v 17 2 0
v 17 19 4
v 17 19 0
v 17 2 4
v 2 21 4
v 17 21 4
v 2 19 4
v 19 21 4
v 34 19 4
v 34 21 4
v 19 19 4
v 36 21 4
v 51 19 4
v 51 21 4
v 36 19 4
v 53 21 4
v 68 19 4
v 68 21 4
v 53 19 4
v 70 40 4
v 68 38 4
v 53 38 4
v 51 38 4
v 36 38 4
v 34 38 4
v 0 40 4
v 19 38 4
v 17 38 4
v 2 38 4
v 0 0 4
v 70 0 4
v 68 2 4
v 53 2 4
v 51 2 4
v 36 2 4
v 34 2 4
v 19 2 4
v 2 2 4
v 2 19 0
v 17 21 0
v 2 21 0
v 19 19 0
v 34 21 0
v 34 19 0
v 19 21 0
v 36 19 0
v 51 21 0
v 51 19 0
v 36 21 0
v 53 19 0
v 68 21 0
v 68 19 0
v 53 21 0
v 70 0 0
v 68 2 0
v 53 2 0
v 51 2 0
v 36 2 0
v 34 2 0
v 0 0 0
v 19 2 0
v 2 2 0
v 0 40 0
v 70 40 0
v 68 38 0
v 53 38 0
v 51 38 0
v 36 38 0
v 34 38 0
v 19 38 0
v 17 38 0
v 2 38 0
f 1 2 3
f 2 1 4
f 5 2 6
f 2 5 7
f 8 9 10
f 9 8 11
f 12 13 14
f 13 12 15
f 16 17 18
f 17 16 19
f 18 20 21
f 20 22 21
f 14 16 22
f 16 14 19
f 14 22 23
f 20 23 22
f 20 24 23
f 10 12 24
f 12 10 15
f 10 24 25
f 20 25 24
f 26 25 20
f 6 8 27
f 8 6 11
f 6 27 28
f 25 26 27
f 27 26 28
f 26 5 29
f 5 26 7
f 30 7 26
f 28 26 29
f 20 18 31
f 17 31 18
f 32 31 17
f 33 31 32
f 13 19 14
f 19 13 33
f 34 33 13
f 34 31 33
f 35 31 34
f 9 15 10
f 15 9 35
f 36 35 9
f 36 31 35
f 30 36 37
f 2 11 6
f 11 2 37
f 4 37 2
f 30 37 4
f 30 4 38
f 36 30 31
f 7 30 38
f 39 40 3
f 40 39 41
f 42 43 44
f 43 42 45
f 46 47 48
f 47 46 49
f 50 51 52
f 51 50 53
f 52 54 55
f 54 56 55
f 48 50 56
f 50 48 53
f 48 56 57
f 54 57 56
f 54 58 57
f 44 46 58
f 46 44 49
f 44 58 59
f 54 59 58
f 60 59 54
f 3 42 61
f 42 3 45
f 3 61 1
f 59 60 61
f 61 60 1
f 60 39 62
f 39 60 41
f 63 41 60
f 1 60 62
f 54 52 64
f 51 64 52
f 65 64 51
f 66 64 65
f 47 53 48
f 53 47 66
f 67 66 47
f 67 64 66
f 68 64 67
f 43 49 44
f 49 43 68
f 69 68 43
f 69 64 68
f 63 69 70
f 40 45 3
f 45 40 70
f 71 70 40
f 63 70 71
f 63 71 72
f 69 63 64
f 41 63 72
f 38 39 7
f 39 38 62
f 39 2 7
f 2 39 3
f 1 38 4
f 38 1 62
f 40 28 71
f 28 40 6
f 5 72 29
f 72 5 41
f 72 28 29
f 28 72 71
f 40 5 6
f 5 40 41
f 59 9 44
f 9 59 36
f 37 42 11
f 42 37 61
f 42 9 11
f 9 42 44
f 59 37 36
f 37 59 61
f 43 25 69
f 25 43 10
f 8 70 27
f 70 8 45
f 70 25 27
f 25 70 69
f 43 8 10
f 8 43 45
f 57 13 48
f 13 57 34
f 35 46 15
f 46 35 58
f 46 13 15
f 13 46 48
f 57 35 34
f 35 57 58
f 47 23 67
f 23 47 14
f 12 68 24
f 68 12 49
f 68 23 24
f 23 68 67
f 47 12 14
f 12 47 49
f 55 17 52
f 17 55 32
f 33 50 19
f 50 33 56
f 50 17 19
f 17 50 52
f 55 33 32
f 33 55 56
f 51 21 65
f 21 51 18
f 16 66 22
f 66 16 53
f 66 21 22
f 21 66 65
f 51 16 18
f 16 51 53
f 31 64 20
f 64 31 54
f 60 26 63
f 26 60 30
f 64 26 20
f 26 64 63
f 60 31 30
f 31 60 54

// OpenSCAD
// ============================================================
//  Lightweighted Mounting Plate  70 × 40 × 4 mm
// ============================================================
//
//  Mass budget
//  -----------
//  Solid volume  =  70 × 40 × 4          = 11 200 mm³  (100 %)
//  Removed       =  4 cols × 2 rows
//                   × 15 × 17 × 4        =  8 160 mm³
//  Retained      =  3 040 mm³            =  27.1 %
//                   → well under 50 % target
//
//  Wall / web analysis
//  -------------------
//  Perimeter border  2 mm  ✓
//  Column webs       2 mm  ✓   (3 webs × 2 mm between 4 cols)
//  Row web           2 mm  ✓   (1 web  × 2 mm between 2 rows)
//
//  BOM
//  ---
//  1 ×  Mounting plate  70 × 40 × 4 mm  (PLA/PETG)  ≈ 3 040 mm³
// ============================================================

// ── Parameters ───────────────────────────────────────────────
plate_x = 70;
plate_y = 40;
plate_z =  4.0;

border  =  2.0;   // perimeter wall thickness (min 2 mm)
web     =  2.0;   // wall between adjacent pockets (min 2 mm)

cols    =  4;     // pocket columns (X direction)
rows    =  2;     // pocket rows    (Y direction)

// ── Derived pocket geometry ───────────────────────────────────
inner_x  = plate_x - 2*border;                   // 66 mm
inner_y  = plate_y - 2*border;                   // 36 mm
pocket_x = (inner_x - (cols-1)*web) / cols;      // 15 mm
pocket_y = (inner_y - (rows-1)*web) / rows;      // 17 mm

// ── Sanity echoes ─────────────────────────────────────────────
echo("pocket_x mm         =", pocket_x);
echo("pocket_y mm         =", pocket_y);
echo("solid volume mm3    =", plate_x * plate_y * plate_z);
echo("removed volume mm3  =", cols * rows * pocket_x * pocket_y * plate_z);
echo("retained volume mm3 =", plate_x*plate_y*plate_z
                             - cols*rows*pocket_x*pocket_y*plate_z);
echo("mass fraction       =", 1 - (cols*rows*pocket_x*pocket_y)
                                  / (plate_x*plate_y));

// ── Geometry ─────────────────────────────────────────────────
difference() {

    // Solid base plate — origin at (0,0,0)
    cube([plate_x, plate_y, plate_z]);

    // Through-pocket grid (full Z depth, no floor needed — through-holes
    // maximise mass reduction while leaving uniform 2 mm perimeter walls)
    for (c = [0 : cols-1])
        for (r = [0 : rows-1])
            translate([
                border + c * (pocket_x + web),
                border + r * (pocket_y + web),
                0
            ])
            cube([pocket_x, pocket_y, plate_z]);
}
